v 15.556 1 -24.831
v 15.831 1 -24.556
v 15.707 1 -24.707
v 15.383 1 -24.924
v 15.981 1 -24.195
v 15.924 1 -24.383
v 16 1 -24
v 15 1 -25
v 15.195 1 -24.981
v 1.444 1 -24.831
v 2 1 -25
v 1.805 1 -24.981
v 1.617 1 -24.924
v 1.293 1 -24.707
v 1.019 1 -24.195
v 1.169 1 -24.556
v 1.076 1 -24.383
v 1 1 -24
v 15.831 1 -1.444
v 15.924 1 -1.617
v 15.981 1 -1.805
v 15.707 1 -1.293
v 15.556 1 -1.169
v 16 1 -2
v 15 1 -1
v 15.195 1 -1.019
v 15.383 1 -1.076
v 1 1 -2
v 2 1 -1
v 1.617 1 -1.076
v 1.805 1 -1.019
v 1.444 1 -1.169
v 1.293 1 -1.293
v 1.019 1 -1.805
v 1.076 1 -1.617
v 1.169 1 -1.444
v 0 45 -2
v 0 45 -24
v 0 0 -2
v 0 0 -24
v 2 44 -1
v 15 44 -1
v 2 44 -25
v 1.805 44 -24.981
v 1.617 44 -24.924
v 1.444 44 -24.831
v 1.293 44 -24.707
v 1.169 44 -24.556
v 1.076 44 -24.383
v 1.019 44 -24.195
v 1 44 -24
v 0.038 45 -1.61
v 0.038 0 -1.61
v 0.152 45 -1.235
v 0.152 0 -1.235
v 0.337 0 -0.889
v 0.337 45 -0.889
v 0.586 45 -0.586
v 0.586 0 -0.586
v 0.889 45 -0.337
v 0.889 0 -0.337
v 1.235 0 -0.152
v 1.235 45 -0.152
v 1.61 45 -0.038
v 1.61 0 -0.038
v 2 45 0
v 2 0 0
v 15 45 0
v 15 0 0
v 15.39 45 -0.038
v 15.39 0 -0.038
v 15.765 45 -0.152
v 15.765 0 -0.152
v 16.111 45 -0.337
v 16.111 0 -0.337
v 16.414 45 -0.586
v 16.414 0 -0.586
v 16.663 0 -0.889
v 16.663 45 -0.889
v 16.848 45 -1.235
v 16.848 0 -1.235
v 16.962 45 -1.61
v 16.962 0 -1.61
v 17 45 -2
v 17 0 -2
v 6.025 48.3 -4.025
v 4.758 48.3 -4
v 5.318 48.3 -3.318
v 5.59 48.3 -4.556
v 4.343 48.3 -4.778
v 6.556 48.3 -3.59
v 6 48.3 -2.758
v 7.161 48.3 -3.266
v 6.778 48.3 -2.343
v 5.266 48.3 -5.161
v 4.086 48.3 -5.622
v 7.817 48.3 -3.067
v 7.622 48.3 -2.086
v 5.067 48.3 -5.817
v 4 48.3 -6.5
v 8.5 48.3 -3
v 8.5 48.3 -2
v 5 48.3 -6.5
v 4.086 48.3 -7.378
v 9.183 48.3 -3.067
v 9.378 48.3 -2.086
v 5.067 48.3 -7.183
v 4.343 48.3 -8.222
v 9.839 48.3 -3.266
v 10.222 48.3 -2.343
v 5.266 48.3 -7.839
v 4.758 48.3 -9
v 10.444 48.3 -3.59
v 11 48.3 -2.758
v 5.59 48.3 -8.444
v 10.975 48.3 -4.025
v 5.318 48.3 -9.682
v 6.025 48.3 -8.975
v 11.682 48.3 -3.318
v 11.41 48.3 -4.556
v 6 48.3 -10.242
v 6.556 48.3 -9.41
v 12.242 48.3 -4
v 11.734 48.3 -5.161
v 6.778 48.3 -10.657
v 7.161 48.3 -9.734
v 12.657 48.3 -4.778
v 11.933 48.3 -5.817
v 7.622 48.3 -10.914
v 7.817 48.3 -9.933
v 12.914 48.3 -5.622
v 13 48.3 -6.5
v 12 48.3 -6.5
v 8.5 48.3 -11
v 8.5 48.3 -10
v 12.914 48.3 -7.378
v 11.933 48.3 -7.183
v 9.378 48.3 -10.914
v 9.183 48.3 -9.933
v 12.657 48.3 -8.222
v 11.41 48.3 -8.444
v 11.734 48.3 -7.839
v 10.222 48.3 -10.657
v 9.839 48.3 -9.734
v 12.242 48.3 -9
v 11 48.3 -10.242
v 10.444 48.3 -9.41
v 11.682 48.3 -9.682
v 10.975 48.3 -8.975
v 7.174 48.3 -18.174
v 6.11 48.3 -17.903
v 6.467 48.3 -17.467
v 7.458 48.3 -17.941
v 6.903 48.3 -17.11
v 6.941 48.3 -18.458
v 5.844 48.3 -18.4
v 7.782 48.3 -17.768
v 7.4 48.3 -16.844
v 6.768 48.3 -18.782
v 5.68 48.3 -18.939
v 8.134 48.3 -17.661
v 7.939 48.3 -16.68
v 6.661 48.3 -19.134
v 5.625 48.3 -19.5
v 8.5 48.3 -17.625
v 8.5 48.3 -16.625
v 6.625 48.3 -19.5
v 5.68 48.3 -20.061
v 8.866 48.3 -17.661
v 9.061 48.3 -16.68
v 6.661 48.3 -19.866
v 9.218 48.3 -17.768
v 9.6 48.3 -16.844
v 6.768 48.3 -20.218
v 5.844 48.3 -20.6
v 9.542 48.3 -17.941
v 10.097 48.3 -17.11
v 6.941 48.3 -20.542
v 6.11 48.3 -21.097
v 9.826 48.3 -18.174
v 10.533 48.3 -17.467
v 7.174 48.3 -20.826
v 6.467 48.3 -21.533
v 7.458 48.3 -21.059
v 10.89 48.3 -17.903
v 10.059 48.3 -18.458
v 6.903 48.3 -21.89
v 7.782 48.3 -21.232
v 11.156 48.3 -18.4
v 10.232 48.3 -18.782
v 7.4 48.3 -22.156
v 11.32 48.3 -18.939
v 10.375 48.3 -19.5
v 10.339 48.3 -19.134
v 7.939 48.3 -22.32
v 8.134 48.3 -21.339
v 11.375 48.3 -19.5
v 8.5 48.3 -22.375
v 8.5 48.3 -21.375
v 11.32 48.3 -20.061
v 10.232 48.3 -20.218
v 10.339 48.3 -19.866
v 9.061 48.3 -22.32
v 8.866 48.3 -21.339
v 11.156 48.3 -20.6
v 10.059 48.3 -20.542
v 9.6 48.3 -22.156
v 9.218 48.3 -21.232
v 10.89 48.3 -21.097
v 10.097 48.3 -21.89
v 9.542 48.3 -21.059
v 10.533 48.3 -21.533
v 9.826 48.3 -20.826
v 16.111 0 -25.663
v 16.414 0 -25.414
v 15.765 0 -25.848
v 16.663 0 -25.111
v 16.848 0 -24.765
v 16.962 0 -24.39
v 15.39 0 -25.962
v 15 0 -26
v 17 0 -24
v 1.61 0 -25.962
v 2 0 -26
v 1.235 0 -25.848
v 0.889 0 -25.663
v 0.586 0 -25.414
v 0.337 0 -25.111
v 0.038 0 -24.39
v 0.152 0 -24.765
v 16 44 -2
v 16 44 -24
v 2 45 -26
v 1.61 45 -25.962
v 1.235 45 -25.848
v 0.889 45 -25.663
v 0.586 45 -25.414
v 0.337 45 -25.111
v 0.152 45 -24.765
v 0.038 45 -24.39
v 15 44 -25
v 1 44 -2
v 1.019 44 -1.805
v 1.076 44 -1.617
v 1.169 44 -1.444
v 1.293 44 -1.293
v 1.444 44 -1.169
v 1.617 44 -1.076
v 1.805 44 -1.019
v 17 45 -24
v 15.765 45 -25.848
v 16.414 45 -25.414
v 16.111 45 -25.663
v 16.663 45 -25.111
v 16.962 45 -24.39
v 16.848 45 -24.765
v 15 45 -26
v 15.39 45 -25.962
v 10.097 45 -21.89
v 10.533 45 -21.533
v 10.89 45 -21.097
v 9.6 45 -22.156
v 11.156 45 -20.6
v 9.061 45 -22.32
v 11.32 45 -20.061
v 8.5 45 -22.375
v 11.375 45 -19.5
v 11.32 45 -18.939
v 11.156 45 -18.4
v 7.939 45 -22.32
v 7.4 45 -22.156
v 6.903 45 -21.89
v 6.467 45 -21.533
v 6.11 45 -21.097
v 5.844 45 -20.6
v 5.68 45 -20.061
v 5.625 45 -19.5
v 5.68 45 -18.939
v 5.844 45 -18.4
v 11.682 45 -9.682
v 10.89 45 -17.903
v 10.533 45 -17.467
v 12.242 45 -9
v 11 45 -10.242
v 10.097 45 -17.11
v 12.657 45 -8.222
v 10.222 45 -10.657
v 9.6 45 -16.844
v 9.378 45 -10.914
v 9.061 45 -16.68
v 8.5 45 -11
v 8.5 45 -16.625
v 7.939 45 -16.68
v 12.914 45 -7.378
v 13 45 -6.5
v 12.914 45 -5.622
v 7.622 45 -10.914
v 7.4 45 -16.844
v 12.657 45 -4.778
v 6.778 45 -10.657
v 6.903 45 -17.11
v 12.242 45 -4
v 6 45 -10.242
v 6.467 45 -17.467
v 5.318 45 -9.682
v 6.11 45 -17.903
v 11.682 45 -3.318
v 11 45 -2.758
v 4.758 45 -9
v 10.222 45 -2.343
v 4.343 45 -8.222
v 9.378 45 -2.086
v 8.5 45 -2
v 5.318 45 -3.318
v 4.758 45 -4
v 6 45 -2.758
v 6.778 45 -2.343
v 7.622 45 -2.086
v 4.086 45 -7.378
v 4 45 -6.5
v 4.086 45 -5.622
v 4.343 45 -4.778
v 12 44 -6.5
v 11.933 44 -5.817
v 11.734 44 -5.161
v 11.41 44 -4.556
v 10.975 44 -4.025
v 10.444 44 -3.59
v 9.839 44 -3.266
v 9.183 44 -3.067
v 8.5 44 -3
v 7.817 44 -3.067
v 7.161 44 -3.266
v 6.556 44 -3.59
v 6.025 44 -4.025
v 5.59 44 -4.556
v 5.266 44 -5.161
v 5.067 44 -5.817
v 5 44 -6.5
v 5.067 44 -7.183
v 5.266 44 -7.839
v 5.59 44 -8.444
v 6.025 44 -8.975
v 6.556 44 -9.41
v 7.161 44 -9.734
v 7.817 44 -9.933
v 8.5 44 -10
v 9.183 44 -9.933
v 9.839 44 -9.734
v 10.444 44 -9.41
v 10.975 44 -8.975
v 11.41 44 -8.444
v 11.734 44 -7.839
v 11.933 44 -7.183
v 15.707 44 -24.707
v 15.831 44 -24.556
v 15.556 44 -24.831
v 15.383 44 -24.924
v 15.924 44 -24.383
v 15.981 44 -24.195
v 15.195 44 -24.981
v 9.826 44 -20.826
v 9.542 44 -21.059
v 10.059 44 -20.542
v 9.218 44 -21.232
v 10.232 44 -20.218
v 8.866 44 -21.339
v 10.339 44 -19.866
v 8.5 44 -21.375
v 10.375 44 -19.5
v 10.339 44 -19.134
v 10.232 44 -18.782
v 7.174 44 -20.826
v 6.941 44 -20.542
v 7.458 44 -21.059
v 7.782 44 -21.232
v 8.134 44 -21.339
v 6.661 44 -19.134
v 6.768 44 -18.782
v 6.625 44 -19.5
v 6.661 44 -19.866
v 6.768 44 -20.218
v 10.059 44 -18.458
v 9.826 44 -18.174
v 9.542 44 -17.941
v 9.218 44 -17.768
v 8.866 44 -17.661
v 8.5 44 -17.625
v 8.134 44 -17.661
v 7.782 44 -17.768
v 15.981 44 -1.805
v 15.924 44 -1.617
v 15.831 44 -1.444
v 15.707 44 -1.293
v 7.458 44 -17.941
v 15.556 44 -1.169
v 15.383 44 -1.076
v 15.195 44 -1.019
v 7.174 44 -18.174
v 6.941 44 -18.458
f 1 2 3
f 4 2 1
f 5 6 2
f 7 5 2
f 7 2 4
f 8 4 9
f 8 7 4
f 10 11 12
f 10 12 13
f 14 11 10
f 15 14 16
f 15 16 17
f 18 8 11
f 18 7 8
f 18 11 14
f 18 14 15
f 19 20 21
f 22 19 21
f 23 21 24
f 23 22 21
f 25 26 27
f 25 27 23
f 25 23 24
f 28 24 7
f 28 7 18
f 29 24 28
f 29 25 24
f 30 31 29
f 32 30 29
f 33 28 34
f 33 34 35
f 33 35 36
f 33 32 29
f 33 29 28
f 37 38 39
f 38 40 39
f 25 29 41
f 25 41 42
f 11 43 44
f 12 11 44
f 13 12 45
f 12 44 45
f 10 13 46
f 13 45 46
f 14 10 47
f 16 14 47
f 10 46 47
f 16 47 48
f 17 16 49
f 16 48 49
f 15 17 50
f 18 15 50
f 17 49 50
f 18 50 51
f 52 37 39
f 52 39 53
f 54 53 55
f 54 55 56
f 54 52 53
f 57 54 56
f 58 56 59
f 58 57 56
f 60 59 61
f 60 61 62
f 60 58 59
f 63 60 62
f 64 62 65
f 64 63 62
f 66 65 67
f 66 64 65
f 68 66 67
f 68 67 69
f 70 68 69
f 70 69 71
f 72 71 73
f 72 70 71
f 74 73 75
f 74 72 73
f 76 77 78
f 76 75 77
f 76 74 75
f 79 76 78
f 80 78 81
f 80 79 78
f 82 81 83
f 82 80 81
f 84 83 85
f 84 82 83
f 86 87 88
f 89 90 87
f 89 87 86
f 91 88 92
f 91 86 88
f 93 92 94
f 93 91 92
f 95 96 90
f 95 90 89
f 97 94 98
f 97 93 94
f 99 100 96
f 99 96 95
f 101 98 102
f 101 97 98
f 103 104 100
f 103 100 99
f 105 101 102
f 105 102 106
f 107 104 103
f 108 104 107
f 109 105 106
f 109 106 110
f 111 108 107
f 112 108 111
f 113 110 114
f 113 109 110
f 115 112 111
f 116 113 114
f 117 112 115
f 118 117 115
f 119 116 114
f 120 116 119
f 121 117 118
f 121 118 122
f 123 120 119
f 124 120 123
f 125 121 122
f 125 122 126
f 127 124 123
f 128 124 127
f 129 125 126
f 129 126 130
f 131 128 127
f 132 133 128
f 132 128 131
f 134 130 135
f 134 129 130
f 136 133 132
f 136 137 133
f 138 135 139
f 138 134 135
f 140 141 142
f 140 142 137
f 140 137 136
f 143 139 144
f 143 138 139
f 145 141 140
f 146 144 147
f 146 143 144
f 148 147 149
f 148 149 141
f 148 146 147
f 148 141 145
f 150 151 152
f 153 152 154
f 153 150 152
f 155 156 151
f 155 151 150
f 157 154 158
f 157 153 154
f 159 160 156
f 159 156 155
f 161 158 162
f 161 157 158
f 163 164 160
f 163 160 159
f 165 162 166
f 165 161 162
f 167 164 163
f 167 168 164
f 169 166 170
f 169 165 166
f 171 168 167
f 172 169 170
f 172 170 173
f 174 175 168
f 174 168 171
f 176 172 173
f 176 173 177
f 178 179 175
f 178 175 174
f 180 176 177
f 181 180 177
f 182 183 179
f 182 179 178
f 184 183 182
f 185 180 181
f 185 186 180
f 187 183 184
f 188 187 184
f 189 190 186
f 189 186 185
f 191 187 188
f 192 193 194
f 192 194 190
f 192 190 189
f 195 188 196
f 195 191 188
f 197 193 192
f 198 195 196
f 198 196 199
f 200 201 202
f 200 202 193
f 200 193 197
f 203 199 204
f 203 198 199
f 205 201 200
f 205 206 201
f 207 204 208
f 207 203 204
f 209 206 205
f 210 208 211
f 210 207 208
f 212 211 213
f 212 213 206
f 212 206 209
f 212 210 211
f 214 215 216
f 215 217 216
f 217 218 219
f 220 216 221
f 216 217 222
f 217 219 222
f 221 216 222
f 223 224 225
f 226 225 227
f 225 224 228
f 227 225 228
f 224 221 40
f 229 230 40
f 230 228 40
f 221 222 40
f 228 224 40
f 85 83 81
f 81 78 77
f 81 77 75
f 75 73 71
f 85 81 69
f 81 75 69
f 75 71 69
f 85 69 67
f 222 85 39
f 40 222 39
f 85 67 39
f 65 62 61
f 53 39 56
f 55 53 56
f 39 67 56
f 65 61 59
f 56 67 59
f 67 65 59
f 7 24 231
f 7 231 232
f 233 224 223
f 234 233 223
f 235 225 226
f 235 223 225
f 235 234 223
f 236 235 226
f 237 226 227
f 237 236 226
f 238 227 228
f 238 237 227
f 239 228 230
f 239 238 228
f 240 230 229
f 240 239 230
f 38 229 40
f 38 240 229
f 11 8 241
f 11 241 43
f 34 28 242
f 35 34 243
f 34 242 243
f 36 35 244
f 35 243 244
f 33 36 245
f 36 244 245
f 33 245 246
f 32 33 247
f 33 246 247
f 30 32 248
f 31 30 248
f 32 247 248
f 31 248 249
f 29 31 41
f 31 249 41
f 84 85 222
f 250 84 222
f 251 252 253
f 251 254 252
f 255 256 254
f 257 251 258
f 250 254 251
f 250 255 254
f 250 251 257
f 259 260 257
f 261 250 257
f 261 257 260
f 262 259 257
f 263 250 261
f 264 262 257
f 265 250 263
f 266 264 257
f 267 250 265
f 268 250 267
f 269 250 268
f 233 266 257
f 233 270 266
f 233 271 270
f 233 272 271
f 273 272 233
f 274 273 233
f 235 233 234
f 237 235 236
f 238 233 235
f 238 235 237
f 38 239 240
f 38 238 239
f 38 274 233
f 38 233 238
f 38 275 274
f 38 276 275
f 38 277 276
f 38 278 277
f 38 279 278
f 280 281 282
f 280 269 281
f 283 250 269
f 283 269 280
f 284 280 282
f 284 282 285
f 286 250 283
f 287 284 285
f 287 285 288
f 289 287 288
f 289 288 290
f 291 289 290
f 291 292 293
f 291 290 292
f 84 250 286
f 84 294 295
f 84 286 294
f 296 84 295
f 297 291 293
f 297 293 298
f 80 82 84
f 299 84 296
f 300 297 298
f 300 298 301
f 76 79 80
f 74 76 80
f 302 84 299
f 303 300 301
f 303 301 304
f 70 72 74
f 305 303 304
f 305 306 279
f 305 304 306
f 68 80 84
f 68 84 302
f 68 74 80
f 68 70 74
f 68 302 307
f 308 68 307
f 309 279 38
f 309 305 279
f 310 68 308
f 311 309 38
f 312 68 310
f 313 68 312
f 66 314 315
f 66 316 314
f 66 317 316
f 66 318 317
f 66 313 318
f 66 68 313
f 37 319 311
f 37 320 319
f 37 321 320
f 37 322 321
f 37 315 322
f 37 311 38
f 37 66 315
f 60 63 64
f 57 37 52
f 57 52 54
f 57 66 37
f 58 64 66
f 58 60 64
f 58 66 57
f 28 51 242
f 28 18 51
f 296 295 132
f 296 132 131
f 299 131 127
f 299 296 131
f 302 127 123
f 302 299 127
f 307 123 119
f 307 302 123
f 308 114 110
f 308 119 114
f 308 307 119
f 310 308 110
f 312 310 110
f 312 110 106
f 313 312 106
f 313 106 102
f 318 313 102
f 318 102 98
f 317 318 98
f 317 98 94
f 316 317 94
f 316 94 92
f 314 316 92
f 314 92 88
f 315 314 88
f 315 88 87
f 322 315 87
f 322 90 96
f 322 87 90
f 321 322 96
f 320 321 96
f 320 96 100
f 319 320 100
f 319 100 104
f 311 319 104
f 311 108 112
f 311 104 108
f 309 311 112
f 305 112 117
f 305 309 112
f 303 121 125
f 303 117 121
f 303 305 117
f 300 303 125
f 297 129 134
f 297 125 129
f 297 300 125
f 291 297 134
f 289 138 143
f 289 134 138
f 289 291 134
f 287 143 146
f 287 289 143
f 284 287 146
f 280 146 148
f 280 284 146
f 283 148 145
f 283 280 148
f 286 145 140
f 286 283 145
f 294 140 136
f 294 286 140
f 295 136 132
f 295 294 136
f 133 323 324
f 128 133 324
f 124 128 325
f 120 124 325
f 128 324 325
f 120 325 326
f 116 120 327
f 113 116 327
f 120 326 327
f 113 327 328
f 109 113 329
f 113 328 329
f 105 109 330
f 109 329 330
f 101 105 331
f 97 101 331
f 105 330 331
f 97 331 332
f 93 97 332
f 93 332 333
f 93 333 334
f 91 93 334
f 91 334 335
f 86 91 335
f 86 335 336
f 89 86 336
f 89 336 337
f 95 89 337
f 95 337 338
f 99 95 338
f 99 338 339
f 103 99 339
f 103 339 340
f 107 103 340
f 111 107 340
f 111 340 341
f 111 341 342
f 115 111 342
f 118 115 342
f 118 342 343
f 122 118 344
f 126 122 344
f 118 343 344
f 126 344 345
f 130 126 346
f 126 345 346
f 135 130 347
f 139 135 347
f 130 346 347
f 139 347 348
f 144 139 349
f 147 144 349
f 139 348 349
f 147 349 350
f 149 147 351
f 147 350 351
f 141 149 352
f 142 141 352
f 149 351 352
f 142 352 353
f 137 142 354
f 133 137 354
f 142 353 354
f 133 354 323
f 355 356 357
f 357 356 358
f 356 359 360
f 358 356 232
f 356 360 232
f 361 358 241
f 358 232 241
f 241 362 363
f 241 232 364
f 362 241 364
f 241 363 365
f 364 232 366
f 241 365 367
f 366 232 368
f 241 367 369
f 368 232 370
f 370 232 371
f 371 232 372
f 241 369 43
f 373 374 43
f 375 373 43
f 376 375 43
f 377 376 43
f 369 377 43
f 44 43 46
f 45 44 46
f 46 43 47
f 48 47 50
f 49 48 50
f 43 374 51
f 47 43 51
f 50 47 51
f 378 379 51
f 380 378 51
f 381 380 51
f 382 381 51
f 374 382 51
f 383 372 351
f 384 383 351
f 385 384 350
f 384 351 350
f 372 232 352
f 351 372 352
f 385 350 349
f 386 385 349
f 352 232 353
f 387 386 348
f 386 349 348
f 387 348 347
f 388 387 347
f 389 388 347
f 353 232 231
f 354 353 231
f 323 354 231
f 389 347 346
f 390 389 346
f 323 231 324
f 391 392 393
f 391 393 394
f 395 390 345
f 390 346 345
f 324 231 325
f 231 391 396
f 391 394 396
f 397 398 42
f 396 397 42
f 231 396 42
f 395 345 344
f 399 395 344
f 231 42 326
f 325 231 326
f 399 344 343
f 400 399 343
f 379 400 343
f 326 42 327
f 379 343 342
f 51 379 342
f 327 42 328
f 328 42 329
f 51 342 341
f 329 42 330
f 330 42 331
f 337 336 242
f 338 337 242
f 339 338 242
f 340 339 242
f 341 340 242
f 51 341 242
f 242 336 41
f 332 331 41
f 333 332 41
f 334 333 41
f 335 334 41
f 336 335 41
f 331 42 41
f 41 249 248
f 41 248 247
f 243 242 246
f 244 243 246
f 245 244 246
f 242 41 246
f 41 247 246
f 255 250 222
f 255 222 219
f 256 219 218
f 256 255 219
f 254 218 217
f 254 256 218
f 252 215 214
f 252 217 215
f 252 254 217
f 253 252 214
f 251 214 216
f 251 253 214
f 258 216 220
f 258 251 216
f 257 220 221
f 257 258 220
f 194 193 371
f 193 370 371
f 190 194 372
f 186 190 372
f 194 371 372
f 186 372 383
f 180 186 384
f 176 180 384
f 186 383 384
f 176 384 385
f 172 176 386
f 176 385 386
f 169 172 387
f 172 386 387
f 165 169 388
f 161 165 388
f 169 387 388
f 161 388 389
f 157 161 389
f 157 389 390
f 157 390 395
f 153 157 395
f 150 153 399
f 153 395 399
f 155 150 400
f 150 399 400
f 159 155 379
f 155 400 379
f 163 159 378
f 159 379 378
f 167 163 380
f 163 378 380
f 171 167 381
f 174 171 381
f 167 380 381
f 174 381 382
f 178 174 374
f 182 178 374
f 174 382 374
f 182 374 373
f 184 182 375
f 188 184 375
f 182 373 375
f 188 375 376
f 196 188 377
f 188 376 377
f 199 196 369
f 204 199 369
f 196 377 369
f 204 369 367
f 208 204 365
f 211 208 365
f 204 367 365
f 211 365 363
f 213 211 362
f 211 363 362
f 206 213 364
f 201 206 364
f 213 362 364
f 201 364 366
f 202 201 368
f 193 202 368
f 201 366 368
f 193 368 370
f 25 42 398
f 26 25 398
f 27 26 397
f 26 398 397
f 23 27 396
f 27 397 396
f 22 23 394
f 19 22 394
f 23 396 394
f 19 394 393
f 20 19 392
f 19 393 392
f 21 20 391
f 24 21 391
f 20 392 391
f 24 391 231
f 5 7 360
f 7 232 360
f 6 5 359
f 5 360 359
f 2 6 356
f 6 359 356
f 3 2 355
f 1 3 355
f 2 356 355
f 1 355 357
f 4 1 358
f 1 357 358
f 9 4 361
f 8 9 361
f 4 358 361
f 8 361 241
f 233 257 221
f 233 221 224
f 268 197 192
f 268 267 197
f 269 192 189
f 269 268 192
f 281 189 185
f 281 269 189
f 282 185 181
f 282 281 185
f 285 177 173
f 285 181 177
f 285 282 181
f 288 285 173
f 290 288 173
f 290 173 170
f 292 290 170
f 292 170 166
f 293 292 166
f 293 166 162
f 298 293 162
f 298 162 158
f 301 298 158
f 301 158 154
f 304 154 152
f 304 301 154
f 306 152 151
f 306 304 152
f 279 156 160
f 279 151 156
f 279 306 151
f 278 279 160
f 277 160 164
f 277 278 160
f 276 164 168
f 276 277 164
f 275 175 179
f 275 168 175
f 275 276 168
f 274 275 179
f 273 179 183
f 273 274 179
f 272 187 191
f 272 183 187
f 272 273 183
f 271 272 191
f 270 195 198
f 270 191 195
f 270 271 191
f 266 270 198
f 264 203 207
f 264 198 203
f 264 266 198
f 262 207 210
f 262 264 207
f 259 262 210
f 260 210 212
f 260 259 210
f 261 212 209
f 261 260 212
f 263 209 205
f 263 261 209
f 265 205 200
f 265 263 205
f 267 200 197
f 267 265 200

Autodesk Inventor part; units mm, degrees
ref_plane "YZ Plane" through (0, 0, 0) normal (1, 0, 0) x (0, 1, 0)
ref_plane "XZ Plane" through (0, 0, 0) normal (0, 1, 0) x (-1, 0, 0)
ref_plane "XY Plane" through (0, 0, 0) normal (0, 0, 1) x (1, 0, 0)
sketch "Sketch1" plane through (0, 0, 0) normal (0, 1, 0) x (-1, 0, 0)
  line L0 (0, 0) -> (-17, 0)
  line L1 (-17, 0) -> (-17, -26)
  line L2 (-17, -26) -> (0, -26)
  line L3 (0, -26) -> (0, 0)
  dimension "d0" = 26
  dimension "d1" = 17
extrude "Extrusion1" add sketch "Sketch1" along normal blind 45
fillet "Fillet1" radius 2 4 edges at (0, 22.5, -26) (0, 22.5, 0) (17, 22.5, -26) (17, 22.5, 0)
sketch "Sketch2" plane through (0, 45, 0) normal (0, 1, 0) x (1, 0, 0)
  circle A0 centre (8.5, 19.5) radius 2.875
  line L0 (15, 26) -> (2, 26) projected
  circle A1 centre (8.5, 6.5) radius 4.5
  line L1 (0, 24) -> (0, 2) projected
  line L2 (2, 0) -> (15, 0) projected
  point P0 (0, 0)
  dimension "d5" = 5.75
  dimension "d6" = 6.5
  dimension "d7" = 9
  dimension "d8" = 8.5
  dimension "d9" = 8.5
  dimension "d10" = 6.5
extrude "Extrusion2" add sketch "Sketch2" along normal blind 3.3
shell "Shell1" thickness 1 removed faces 2 at (7.7246, 48.3, -18.7113) at (10.0336, 48.3, -5.5053)
properties part number "battery model"
